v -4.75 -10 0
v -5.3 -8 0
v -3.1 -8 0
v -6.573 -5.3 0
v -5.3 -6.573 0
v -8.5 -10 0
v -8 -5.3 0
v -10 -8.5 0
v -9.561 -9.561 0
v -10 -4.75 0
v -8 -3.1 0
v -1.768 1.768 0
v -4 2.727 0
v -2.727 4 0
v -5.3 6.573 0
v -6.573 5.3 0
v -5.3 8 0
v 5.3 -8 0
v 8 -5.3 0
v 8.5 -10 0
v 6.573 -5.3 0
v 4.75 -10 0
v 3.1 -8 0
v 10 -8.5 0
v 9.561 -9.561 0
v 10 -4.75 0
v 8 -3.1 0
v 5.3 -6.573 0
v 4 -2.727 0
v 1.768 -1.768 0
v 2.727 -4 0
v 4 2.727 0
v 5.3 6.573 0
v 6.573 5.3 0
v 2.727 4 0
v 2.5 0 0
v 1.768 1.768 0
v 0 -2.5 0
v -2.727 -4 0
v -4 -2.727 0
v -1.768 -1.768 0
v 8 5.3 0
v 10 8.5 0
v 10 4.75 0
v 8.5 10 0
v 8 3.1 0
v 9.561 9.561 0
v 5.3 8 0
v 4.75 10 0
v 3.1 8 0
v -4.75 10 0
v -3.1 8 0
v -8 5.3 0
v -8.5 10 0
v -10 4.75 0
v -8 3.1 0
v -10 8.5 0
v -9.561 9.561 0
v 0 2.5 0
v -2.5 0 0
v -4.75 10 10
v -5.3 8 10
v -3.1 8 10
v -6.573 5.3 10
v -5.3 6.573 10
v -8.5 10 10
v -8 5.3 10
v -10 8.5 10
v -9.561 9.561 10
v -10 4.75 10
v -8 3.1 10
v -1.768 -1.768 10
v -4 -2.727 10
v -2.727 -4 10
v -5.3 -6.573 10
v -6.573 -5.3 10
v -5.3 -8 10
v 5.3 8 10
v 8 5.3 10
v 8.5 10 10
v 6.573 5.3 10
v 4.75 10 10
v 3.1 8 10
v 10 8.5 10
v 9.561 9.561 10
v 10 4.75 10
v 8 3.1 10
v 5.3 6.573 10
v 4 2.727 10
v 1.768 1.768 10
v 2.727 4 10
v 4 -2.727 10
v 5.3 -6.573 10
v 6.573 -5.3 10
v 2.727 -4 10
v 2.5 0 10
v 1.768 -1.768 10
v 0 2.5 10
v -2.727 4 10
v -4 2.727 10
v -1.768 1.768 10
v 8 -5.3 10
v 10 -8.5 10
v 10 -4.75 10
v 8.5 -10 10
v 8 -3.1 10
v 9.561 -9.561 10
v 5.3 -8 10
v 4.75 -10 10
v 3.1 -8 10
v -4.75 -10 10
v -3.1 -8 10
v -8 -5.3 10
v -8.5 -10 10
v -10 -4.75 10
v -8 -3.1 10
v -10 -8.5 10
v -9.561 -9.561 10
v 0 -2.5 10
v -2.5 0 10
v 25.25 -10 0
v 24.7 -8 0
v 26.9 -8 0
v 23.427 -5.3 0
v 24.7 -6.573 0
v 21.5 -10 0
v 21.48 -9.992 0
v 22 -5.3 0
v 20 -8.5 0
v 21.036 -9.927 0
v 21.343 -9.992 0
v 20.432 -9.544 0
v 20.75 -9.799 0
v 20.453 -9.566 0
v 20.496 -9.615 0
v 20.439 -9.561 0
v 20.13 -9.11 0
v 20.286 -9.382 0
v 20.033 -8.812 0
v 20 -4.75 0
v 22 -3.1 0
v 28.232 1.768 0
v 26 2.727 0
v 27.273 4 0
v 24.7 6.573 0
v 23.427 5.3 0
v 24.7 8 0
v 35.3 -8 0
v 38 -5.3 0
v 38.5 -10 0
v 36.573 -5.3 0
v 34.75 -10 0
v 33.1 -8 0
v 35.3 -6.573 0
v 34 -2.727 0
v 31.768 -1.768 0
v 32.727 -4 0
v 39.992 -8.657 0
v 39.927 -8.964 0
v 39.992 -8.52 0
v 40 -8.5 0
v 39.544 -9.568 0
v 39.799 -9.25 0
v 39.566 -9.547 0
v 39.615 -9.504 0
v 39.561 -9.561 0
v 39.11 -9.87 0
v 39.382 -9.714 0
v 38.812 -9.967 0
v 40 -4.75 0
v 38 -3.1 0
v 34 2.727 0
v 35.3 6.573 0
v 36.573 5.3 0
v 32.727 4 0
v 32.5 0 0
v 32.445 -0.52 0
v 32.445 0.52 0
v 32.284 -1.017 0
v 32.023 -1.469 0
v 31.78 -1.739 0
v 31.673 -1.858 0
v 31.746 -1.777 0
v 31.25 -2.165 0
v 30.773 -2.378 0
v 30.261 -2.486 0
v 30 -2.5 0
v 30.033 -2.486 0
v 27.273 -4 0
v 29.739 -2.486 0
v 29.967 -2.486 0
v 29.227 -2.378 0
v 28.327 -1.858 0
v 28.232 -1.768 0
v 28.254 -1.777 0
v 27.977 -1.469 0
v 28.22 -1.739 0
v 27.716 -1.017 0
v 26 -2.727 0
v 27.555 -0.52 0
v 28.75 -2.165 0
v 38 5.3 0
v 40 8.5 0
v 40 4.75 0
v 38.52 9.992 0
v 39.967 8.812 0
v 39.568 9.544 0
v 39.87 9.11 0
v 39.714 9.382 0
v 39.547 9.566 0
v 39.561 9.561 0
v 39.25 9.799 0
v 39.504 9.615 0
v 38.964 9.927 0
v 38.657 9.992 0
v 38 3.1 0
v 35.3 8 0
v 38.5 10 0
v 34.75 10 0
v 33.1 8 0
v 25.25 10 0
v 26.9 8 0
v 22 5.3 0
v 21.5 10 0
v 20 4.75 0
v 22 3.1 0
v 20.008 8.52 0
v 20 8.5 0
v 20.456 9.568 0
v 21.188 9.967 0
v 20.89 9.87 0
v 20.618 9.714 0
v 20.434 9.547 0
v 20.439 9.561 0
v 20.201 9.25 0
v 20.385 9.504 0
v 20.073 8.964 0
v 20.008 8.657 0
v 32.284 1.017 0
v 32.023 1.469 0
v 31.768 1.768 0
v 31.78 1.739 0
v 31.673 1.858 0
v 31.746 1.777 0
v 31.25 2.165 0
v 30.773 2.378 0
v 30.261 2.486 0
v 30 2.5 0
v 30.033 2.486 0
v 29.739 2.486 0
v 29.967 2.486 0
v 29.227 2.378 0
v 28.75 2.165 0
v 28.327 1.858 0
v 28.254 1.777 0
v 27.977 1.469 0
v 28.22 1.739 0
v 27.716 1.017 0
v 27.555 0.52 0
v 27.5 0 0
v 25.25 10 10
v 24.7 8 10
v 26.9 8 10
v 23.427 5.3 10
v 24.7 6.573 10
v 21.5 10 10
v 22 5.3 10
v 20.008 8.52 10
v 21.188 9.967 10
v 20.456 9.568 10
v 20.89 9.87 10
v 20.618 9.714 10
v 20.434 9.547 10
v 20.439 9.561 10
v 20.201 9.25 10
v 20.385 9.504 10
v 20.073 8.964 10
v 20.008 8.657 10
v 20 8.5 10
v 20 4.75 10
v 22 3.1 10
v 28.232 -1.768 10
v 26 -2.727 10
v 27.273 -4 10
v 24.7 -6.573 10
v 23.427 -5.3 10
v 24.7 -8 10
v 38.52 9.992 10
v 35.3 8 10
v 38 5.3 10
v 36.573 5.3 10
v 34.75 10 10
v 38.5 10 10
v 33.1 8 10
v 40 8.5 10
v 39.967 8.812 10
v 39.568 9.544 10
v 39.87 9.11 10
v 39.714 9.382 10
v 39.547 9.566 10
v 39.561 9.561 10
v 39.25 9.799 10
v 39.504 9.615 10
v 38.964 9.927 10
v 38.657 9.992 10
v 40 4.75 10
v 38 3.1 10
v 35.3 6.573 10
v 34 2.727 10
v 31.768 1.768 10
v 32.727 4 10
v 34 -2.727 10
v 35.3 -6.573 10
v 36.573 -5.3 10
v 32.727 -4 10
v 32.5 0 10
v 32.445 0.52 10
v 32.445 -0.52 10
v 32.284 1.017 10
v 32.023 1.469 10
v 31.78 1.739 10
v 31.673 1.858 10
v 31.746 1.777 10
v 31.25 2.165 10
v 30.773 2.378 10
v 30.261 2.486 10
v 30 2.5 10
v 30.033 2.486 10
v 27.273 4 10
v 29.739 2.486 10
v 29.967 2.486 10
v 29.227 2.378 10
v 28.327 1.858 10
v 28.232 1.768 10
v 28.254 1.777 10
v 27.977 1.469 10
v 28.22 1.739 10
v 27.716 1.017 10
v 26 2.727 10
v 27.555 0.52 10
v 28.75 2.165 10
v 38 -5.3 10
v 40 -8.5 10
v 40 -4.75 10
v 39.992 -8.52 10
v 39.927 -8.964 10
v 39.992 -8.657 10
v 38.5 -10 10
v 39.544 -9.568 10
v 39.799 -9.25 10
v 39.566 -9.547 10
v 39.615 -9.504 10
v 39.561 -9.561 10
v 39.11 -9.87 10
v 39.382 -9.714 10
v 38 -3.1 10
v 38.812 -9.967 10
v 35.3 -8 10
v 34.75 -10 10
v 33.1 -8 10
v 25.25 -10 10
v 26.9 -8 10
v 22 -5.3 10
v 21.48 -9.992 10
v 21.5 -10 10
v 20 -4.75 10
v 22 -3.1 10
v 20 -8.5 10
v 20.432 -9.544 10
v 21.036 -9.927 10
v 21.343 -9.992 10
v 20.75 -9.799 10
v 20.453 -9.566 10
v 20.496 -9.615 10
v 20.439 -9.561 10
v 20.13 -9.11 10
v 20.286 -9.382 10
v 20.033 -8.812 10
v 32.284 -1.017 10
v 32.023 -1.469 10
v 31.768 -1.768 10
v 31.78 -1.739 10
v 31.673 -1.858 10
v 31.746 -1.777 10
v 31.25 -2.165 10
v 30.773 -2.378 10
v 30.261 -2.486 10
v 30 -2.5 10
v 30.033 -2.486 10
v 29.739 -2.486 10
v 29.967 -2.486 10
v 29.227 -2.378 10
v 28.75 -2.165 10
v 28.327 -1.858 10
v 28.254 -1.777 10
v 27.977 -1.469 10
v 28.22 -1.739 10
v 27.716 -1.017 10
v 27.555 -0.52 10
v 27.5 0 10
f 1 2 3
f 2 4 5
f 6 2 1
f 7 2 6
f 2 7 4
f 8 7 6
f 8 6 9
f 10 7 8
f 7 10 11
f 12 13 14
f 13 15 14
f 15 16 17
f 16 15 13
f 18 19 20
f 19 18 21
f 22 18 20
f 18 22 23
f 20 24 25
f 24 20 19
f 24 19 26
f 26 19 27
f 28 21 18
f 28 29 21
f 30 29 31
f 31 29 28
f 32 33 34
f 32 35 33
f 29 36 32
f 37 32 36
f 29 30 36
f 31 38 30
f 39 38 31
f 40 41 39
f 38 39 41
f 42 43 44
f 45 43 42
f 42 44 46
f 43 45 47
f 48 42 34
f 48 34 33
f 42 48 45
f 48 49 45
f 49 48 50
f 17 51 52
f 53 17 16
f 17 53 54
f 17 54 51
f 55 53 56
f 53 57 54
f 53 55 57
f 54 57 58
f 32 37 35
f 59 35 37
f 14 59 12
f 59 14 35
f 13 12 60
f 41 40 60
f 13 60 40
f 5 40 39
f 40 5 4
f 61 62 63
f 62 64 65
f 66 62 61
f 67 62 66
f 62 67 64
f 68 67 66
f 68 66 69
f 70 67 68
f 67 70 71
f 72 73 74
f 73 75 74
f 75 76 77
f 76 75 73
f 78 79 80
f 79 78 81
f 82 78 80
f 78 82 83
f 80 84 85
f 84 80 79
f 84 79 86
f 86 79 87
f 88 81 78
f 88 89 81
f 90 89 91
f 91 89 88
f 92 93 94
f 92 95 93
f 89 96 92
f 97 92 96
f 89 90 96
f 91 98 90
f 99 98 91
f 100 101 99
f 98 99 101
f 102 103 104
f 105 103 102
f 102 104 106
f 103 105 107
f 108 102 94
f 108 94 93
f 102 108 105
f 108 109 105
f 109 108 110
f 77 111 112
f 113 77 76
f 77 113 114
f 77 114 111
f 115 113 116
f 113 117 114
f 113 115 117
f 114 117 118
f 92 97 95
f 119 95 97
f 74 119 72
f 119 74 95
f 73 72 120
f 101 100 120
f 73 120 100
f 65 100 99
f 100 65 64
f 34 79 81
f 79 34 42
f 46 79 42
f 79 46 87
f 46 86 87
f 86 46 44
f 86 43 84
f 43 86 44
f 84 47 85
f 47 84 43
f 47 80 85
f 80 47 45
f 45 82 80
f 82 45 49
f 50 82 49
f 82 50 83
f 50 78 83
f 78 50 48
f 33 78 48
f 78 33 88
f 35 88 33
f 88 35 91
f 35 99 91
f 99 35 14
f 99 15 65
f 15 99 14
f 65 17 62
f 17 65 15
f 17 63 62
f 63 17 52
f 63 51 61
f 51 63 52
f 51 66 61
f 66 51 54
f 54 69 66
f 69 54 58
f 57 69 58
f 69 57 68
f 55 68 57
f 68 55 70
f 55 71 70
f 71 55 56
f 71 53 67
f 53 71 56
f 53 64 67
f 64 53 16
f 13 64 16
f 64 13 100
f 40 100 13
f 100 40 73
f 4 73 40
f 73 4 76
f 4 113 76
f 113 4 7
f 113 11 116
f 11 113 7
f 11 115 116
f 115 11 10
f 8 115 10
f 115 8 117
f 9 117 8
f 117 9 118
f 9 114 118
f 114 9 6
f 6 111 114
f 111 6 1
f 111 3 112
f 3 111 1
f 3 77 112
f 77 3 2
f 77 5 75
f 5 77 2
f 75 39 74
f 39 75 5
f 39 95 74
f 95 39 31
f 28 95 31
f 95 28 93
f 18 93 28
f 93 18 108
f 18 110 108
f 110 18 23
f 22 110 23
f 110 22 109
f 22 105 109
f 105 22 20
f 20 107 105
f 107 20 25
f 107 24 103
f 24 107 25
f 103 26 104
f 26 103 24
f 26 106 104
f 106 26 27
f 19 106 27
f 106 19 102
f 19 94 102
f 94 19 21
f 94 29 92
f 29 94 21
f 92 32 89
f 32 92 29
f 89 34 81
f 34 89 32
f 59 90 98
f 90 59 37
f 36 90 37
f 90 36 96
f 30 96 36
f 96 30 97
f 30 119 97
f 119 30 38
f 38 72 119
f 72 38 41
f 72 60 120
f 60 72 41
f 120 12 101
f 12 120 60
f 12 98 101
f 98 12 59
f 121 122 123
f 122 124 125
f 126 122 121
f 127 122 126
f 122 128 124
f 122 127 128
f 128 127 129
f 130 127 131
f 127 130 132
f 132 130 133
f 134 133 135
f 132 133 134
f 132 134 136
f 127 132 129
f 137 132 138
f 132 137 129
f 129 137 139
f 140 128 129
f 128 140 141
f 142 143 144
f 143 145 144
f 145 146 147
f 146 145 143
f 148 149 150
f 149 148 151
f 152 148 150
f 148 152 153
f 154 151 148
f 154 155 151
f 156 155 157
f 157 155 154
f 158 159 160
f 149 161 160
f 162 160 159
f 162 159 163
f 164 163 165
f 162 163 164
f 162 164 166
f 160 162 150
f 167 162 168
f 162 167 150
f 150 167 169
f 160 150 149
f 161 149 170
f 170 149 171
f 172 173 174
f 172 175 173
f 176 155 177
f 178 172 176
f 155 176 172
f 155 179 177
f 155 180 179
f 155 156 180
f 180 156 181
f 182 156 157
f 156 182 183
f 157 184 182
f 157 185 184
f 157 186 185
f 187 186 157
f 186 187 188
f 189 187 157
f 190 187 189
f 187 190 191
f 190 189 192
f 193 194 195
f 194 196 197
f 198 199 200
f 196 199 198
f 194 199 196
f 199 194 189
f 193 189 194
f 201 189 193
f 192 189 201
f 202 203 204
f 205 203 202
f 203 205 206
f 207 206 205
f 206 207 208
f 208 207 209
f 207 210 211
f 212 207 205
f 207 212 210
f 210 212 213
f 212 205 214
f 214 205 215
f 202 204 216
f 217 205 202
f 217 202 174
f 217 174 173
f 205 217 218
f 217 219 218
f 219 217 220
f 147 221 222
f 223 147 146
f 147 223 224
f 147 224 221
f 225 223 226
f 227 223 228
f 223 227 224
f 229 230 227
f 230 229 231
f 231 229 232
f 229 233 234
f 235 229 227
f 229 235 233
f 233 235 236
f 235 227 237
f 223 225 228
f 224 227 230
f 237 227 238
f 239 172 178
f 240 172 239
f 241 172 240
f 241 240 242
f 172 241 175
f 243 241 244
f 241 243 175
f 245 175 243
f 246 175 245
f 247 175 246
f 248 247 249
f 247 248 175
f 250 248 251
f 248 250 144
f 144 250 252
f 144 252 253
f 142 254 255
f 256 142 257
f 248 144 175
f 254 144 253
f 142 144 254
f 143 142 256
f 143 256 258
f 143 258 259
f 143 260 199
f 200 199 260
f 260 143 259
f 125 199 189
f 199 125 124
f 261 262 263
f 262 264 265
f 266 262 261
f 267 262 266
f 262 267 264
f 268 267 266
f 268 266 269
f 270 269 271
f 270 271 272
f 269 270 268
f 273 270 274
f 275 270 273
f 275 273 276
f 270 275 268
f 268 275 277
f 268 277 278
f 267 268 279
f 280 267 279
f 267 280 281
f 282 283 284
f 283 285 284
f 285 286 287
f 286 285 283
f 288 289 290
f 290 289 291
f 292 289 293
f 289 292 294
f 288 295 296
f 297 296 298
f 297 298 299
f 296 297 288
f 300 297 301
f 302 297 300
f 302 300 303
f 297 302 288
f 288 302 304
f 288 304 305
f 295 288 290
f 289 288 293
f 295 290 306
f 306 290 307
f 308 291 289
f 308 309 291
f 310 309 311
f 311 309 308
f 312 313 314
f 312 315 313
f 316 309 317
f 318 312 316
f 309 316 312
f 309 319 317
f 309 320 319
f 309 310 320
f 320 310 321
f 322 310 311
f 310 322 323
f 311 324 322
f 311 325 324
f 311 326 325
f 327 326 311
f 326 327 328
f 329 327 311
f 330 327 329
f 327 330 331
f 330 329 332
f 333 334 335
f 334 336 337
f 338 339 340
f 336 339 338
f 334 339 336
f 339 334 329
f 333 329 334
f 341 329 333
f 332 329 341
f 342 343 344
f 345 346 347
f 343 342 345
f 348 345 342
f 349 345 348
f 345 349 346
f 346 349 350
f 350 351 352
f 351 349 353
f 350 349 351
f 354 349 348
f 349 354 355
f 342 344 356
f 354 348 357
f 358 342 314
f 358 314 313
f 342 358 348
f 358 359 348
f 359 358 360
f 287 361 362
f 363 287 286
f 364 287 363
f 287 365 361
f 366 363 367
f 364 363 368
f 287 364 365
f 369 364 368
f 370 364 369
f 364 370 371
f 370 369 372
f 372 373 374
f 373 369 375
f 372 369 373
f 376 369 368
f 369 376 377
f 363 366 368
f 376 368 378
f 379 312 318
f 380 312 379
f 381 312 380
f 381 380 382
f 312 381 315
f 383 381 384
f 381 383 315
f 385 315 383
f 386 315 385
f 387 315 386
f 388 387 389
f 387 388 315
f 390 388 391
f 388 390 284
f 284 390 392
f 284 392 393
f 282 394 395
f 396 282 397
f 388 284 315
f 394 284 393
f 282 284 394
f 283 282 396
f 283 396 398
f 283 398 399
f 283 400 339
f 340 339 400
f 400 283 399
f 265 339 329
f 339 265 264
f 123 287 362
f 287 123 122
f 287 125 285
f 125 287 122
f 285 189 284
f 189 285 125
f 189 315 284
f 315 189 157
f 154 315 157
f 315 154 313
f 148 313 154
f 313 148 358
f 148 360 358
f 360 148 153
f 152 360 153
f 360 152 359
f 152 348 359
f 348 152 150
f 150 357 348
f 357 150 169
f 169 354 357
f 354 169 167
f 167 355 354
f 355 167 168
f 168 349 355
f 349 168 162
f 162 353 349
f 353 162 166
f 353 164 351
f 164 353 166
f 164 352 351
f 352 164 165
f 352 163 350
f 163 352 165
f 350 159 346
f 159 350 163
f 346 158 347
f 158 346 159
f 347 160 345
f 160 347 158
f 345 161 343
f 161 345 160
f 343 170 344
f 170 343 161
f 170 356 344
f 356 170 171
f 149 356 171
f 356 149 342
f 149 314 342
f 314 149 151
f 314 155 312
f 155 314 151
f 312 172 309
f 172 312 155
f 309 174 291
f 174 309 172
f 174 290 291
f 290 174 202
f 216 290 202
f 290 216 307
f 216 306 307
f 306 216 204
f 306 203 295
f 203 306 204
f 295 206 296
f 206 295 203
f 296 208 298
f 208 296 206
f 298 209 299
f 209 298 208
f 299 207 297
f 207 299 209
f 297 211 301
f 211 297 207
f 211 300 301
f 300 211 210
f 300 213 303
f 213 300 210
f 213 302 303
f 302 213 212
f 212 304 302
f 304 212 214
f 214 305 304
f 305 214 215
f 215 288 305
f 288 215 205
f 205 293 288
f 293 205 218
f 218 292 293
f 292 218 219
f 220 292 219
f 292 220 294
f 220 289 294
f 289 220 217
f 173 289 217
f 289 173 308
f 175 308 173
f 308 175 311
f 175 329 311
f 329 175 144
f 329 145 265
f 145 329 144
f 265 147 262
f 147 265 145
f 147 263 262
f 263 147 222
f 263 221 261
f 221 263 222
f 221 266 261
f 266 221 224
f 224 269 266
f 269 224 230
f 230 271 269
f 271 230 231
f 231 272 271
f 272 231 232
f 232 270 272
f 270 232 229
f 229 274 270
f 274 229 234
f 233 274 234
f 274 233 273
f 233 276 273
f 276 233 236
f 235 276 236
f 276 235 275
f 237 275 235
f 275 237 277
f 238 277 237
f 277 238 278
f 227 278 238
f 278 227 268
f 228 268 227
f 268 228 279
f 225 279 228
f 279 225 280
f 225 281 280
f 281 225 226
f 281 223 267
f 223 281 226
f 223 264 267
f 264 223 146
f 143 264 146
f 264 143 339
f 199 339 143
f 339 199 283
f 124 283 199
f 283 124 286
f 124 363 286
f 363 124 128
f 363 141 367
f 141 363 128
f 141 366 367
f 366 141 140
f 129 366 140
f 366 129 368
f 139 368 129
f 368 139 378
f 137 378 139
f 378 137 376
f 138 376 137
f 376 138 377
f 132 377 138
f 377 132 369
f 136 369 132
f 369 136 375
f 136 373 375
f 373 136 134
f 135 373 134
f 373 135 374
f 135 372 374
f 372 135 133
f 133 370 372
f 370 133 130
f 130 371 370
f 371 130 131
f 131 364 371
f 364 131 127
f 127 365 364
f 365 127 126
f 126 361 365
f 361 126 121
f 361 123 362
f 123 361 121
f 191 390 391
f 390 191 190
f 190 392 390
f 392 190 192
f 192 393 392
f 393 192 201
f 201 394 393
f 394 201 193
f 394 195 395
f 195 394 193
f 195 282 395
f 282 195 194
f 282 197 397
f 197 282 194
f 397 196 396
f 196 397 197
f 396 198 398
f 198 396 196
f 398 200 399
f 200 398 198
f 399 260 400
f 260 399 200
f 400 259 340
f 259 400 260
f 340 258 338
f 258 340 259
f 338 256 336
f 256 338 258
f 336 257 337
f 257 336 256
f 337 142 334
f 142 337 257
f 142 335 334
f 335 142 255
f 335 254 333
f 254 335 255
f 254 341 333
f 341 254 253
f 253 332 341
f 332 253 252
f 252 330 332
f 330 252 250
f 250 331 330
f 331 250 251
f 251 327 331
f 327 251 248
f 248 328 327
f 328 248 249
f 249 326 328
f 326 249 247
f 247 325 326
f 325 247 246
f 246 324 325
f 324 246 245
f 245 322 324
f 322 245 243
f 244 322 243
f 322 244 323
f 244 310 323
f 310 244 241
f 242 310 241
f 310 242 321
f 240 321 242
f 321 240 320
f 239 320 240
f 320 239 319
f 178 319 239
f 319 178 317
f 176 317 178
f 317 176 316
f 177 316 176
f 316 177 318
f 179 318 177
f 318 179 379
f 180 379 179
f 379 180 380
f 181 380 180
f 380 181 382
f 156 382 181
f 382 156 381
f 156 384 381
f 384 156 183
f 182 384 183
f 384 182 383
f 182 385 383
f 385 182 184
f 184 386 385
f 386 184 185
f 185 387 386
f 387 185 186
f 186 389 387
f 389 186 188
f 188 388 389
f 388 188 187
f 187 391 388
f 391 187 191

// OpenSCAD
// Aleksandr Saechnikov 17 june 2015

extrusion_profile_20x20_v_slot(size = 20, height = 10);
translate([30, 0, 0]) extrusion_profile_20x20_v_slot_smooth(size = 20, height = 10);

$fn = 30;

module extrusion_profile_20x20_v_slot(size = 20, height = 10) {
	echo("2020 profile " + height);
	color([0.7, 0.7, 0.7]) linear_extrude(height = height) {
		union() {
			extrusion_profile_20x20_v_slot_part(size);
			rotate([0, 0, 90]) extrusion_profile_20x20_v_slot_part(size);
			rotate([0, 0, 180]) extrusion_profile_20x20_v_slot_part(size);
			rotate([0, 0, 270]) extrusion_profile_20x20_v_slot_part(size);
		}
	}
}

module extrusion_profile_20x20_v_slot_part(size = 20) {
	d = 5;
	r = 1.5;
	s1 = 1.8;
	s2 = 2;
	s3 = 6;
	s4 = 6.2;
	s5 = 9.5;
	s6 = 10.6;
	s7 = 20;

	reSize = size / 20; // Scalling

	k0 = 0;
	k1 = d * 0.5 * cos(45) * reSize;
	k2 = d * 0.5 * reSize;
	k3 = ((s7 * 0.5 - s3) - s1 * 0.5 * sqrt(2)) * reSize;
	k4 = s4 * 0.5 * reSize;
	k5 = (s7 * 0.5 - s3) * reSize;
	k6 = s6 * 0.5 * reSize;
	k7 = (s6 * 0.5 + s1 * 0.5 * sqrt(2)) * reSize;
	k8 = (s7 * 0.5 - s2) * reSize;
	k9 = s5 * 0.5 * reSize;
	k10 = s7 * 0.5 * reSize;
	k10_1 = k10 - r * (1 - cos(45)) * reSize;
	k10_2 = k10 - r * reSize;

	polygon(points = [
		[k1, k1],
		[k0, k2],
		[k0, k5],
		[k3, k5],
		[k6, k7],
		[k6, k8],
		[k4, k8],
		[k9, k10],
		[k10_2, k10],
		[k10_1, k10_1],
		[k10, k10_2],
		[k10, k9],
		[k8, k4],
		[k8, k6],
		[k7, k6],
		[k5, k3],
		[k5, k0],
		[k2, k0]
	]);
}

module extrusion_profile_20x20_v_slot_smooth(size = 20, height = 10) {
	linear_extrude(height = height) {
		difference() {
			union() {
				extrusion_profile_20x20_v_slot_part_smooth(size);
				rotate([0, 0, 90]) extrusion_profile_20x20_v_slot_part_smooth(size);
				rotate([0, 0, 180]) extrusion_profile_20x20_v_slot_part_smooth(size);
				rotate([0, 0, 270]) extrusion_profile_20x20_v_slot_part_smooth(size);
			}
			circle([0, 0], r = size / 20. * 2.5);
		}
	}
}

module extrusion_profile_20x20_v_slot_part_smooth(size = 20) {
	r_center = 0.5 * size - 1.5 * size / 20;
	union() {
		translate([r_center, r_center]) circle(r = 1.5 * size / 20);
		extrusion_profile_20x20_v_slot_part(size);
	}
}
